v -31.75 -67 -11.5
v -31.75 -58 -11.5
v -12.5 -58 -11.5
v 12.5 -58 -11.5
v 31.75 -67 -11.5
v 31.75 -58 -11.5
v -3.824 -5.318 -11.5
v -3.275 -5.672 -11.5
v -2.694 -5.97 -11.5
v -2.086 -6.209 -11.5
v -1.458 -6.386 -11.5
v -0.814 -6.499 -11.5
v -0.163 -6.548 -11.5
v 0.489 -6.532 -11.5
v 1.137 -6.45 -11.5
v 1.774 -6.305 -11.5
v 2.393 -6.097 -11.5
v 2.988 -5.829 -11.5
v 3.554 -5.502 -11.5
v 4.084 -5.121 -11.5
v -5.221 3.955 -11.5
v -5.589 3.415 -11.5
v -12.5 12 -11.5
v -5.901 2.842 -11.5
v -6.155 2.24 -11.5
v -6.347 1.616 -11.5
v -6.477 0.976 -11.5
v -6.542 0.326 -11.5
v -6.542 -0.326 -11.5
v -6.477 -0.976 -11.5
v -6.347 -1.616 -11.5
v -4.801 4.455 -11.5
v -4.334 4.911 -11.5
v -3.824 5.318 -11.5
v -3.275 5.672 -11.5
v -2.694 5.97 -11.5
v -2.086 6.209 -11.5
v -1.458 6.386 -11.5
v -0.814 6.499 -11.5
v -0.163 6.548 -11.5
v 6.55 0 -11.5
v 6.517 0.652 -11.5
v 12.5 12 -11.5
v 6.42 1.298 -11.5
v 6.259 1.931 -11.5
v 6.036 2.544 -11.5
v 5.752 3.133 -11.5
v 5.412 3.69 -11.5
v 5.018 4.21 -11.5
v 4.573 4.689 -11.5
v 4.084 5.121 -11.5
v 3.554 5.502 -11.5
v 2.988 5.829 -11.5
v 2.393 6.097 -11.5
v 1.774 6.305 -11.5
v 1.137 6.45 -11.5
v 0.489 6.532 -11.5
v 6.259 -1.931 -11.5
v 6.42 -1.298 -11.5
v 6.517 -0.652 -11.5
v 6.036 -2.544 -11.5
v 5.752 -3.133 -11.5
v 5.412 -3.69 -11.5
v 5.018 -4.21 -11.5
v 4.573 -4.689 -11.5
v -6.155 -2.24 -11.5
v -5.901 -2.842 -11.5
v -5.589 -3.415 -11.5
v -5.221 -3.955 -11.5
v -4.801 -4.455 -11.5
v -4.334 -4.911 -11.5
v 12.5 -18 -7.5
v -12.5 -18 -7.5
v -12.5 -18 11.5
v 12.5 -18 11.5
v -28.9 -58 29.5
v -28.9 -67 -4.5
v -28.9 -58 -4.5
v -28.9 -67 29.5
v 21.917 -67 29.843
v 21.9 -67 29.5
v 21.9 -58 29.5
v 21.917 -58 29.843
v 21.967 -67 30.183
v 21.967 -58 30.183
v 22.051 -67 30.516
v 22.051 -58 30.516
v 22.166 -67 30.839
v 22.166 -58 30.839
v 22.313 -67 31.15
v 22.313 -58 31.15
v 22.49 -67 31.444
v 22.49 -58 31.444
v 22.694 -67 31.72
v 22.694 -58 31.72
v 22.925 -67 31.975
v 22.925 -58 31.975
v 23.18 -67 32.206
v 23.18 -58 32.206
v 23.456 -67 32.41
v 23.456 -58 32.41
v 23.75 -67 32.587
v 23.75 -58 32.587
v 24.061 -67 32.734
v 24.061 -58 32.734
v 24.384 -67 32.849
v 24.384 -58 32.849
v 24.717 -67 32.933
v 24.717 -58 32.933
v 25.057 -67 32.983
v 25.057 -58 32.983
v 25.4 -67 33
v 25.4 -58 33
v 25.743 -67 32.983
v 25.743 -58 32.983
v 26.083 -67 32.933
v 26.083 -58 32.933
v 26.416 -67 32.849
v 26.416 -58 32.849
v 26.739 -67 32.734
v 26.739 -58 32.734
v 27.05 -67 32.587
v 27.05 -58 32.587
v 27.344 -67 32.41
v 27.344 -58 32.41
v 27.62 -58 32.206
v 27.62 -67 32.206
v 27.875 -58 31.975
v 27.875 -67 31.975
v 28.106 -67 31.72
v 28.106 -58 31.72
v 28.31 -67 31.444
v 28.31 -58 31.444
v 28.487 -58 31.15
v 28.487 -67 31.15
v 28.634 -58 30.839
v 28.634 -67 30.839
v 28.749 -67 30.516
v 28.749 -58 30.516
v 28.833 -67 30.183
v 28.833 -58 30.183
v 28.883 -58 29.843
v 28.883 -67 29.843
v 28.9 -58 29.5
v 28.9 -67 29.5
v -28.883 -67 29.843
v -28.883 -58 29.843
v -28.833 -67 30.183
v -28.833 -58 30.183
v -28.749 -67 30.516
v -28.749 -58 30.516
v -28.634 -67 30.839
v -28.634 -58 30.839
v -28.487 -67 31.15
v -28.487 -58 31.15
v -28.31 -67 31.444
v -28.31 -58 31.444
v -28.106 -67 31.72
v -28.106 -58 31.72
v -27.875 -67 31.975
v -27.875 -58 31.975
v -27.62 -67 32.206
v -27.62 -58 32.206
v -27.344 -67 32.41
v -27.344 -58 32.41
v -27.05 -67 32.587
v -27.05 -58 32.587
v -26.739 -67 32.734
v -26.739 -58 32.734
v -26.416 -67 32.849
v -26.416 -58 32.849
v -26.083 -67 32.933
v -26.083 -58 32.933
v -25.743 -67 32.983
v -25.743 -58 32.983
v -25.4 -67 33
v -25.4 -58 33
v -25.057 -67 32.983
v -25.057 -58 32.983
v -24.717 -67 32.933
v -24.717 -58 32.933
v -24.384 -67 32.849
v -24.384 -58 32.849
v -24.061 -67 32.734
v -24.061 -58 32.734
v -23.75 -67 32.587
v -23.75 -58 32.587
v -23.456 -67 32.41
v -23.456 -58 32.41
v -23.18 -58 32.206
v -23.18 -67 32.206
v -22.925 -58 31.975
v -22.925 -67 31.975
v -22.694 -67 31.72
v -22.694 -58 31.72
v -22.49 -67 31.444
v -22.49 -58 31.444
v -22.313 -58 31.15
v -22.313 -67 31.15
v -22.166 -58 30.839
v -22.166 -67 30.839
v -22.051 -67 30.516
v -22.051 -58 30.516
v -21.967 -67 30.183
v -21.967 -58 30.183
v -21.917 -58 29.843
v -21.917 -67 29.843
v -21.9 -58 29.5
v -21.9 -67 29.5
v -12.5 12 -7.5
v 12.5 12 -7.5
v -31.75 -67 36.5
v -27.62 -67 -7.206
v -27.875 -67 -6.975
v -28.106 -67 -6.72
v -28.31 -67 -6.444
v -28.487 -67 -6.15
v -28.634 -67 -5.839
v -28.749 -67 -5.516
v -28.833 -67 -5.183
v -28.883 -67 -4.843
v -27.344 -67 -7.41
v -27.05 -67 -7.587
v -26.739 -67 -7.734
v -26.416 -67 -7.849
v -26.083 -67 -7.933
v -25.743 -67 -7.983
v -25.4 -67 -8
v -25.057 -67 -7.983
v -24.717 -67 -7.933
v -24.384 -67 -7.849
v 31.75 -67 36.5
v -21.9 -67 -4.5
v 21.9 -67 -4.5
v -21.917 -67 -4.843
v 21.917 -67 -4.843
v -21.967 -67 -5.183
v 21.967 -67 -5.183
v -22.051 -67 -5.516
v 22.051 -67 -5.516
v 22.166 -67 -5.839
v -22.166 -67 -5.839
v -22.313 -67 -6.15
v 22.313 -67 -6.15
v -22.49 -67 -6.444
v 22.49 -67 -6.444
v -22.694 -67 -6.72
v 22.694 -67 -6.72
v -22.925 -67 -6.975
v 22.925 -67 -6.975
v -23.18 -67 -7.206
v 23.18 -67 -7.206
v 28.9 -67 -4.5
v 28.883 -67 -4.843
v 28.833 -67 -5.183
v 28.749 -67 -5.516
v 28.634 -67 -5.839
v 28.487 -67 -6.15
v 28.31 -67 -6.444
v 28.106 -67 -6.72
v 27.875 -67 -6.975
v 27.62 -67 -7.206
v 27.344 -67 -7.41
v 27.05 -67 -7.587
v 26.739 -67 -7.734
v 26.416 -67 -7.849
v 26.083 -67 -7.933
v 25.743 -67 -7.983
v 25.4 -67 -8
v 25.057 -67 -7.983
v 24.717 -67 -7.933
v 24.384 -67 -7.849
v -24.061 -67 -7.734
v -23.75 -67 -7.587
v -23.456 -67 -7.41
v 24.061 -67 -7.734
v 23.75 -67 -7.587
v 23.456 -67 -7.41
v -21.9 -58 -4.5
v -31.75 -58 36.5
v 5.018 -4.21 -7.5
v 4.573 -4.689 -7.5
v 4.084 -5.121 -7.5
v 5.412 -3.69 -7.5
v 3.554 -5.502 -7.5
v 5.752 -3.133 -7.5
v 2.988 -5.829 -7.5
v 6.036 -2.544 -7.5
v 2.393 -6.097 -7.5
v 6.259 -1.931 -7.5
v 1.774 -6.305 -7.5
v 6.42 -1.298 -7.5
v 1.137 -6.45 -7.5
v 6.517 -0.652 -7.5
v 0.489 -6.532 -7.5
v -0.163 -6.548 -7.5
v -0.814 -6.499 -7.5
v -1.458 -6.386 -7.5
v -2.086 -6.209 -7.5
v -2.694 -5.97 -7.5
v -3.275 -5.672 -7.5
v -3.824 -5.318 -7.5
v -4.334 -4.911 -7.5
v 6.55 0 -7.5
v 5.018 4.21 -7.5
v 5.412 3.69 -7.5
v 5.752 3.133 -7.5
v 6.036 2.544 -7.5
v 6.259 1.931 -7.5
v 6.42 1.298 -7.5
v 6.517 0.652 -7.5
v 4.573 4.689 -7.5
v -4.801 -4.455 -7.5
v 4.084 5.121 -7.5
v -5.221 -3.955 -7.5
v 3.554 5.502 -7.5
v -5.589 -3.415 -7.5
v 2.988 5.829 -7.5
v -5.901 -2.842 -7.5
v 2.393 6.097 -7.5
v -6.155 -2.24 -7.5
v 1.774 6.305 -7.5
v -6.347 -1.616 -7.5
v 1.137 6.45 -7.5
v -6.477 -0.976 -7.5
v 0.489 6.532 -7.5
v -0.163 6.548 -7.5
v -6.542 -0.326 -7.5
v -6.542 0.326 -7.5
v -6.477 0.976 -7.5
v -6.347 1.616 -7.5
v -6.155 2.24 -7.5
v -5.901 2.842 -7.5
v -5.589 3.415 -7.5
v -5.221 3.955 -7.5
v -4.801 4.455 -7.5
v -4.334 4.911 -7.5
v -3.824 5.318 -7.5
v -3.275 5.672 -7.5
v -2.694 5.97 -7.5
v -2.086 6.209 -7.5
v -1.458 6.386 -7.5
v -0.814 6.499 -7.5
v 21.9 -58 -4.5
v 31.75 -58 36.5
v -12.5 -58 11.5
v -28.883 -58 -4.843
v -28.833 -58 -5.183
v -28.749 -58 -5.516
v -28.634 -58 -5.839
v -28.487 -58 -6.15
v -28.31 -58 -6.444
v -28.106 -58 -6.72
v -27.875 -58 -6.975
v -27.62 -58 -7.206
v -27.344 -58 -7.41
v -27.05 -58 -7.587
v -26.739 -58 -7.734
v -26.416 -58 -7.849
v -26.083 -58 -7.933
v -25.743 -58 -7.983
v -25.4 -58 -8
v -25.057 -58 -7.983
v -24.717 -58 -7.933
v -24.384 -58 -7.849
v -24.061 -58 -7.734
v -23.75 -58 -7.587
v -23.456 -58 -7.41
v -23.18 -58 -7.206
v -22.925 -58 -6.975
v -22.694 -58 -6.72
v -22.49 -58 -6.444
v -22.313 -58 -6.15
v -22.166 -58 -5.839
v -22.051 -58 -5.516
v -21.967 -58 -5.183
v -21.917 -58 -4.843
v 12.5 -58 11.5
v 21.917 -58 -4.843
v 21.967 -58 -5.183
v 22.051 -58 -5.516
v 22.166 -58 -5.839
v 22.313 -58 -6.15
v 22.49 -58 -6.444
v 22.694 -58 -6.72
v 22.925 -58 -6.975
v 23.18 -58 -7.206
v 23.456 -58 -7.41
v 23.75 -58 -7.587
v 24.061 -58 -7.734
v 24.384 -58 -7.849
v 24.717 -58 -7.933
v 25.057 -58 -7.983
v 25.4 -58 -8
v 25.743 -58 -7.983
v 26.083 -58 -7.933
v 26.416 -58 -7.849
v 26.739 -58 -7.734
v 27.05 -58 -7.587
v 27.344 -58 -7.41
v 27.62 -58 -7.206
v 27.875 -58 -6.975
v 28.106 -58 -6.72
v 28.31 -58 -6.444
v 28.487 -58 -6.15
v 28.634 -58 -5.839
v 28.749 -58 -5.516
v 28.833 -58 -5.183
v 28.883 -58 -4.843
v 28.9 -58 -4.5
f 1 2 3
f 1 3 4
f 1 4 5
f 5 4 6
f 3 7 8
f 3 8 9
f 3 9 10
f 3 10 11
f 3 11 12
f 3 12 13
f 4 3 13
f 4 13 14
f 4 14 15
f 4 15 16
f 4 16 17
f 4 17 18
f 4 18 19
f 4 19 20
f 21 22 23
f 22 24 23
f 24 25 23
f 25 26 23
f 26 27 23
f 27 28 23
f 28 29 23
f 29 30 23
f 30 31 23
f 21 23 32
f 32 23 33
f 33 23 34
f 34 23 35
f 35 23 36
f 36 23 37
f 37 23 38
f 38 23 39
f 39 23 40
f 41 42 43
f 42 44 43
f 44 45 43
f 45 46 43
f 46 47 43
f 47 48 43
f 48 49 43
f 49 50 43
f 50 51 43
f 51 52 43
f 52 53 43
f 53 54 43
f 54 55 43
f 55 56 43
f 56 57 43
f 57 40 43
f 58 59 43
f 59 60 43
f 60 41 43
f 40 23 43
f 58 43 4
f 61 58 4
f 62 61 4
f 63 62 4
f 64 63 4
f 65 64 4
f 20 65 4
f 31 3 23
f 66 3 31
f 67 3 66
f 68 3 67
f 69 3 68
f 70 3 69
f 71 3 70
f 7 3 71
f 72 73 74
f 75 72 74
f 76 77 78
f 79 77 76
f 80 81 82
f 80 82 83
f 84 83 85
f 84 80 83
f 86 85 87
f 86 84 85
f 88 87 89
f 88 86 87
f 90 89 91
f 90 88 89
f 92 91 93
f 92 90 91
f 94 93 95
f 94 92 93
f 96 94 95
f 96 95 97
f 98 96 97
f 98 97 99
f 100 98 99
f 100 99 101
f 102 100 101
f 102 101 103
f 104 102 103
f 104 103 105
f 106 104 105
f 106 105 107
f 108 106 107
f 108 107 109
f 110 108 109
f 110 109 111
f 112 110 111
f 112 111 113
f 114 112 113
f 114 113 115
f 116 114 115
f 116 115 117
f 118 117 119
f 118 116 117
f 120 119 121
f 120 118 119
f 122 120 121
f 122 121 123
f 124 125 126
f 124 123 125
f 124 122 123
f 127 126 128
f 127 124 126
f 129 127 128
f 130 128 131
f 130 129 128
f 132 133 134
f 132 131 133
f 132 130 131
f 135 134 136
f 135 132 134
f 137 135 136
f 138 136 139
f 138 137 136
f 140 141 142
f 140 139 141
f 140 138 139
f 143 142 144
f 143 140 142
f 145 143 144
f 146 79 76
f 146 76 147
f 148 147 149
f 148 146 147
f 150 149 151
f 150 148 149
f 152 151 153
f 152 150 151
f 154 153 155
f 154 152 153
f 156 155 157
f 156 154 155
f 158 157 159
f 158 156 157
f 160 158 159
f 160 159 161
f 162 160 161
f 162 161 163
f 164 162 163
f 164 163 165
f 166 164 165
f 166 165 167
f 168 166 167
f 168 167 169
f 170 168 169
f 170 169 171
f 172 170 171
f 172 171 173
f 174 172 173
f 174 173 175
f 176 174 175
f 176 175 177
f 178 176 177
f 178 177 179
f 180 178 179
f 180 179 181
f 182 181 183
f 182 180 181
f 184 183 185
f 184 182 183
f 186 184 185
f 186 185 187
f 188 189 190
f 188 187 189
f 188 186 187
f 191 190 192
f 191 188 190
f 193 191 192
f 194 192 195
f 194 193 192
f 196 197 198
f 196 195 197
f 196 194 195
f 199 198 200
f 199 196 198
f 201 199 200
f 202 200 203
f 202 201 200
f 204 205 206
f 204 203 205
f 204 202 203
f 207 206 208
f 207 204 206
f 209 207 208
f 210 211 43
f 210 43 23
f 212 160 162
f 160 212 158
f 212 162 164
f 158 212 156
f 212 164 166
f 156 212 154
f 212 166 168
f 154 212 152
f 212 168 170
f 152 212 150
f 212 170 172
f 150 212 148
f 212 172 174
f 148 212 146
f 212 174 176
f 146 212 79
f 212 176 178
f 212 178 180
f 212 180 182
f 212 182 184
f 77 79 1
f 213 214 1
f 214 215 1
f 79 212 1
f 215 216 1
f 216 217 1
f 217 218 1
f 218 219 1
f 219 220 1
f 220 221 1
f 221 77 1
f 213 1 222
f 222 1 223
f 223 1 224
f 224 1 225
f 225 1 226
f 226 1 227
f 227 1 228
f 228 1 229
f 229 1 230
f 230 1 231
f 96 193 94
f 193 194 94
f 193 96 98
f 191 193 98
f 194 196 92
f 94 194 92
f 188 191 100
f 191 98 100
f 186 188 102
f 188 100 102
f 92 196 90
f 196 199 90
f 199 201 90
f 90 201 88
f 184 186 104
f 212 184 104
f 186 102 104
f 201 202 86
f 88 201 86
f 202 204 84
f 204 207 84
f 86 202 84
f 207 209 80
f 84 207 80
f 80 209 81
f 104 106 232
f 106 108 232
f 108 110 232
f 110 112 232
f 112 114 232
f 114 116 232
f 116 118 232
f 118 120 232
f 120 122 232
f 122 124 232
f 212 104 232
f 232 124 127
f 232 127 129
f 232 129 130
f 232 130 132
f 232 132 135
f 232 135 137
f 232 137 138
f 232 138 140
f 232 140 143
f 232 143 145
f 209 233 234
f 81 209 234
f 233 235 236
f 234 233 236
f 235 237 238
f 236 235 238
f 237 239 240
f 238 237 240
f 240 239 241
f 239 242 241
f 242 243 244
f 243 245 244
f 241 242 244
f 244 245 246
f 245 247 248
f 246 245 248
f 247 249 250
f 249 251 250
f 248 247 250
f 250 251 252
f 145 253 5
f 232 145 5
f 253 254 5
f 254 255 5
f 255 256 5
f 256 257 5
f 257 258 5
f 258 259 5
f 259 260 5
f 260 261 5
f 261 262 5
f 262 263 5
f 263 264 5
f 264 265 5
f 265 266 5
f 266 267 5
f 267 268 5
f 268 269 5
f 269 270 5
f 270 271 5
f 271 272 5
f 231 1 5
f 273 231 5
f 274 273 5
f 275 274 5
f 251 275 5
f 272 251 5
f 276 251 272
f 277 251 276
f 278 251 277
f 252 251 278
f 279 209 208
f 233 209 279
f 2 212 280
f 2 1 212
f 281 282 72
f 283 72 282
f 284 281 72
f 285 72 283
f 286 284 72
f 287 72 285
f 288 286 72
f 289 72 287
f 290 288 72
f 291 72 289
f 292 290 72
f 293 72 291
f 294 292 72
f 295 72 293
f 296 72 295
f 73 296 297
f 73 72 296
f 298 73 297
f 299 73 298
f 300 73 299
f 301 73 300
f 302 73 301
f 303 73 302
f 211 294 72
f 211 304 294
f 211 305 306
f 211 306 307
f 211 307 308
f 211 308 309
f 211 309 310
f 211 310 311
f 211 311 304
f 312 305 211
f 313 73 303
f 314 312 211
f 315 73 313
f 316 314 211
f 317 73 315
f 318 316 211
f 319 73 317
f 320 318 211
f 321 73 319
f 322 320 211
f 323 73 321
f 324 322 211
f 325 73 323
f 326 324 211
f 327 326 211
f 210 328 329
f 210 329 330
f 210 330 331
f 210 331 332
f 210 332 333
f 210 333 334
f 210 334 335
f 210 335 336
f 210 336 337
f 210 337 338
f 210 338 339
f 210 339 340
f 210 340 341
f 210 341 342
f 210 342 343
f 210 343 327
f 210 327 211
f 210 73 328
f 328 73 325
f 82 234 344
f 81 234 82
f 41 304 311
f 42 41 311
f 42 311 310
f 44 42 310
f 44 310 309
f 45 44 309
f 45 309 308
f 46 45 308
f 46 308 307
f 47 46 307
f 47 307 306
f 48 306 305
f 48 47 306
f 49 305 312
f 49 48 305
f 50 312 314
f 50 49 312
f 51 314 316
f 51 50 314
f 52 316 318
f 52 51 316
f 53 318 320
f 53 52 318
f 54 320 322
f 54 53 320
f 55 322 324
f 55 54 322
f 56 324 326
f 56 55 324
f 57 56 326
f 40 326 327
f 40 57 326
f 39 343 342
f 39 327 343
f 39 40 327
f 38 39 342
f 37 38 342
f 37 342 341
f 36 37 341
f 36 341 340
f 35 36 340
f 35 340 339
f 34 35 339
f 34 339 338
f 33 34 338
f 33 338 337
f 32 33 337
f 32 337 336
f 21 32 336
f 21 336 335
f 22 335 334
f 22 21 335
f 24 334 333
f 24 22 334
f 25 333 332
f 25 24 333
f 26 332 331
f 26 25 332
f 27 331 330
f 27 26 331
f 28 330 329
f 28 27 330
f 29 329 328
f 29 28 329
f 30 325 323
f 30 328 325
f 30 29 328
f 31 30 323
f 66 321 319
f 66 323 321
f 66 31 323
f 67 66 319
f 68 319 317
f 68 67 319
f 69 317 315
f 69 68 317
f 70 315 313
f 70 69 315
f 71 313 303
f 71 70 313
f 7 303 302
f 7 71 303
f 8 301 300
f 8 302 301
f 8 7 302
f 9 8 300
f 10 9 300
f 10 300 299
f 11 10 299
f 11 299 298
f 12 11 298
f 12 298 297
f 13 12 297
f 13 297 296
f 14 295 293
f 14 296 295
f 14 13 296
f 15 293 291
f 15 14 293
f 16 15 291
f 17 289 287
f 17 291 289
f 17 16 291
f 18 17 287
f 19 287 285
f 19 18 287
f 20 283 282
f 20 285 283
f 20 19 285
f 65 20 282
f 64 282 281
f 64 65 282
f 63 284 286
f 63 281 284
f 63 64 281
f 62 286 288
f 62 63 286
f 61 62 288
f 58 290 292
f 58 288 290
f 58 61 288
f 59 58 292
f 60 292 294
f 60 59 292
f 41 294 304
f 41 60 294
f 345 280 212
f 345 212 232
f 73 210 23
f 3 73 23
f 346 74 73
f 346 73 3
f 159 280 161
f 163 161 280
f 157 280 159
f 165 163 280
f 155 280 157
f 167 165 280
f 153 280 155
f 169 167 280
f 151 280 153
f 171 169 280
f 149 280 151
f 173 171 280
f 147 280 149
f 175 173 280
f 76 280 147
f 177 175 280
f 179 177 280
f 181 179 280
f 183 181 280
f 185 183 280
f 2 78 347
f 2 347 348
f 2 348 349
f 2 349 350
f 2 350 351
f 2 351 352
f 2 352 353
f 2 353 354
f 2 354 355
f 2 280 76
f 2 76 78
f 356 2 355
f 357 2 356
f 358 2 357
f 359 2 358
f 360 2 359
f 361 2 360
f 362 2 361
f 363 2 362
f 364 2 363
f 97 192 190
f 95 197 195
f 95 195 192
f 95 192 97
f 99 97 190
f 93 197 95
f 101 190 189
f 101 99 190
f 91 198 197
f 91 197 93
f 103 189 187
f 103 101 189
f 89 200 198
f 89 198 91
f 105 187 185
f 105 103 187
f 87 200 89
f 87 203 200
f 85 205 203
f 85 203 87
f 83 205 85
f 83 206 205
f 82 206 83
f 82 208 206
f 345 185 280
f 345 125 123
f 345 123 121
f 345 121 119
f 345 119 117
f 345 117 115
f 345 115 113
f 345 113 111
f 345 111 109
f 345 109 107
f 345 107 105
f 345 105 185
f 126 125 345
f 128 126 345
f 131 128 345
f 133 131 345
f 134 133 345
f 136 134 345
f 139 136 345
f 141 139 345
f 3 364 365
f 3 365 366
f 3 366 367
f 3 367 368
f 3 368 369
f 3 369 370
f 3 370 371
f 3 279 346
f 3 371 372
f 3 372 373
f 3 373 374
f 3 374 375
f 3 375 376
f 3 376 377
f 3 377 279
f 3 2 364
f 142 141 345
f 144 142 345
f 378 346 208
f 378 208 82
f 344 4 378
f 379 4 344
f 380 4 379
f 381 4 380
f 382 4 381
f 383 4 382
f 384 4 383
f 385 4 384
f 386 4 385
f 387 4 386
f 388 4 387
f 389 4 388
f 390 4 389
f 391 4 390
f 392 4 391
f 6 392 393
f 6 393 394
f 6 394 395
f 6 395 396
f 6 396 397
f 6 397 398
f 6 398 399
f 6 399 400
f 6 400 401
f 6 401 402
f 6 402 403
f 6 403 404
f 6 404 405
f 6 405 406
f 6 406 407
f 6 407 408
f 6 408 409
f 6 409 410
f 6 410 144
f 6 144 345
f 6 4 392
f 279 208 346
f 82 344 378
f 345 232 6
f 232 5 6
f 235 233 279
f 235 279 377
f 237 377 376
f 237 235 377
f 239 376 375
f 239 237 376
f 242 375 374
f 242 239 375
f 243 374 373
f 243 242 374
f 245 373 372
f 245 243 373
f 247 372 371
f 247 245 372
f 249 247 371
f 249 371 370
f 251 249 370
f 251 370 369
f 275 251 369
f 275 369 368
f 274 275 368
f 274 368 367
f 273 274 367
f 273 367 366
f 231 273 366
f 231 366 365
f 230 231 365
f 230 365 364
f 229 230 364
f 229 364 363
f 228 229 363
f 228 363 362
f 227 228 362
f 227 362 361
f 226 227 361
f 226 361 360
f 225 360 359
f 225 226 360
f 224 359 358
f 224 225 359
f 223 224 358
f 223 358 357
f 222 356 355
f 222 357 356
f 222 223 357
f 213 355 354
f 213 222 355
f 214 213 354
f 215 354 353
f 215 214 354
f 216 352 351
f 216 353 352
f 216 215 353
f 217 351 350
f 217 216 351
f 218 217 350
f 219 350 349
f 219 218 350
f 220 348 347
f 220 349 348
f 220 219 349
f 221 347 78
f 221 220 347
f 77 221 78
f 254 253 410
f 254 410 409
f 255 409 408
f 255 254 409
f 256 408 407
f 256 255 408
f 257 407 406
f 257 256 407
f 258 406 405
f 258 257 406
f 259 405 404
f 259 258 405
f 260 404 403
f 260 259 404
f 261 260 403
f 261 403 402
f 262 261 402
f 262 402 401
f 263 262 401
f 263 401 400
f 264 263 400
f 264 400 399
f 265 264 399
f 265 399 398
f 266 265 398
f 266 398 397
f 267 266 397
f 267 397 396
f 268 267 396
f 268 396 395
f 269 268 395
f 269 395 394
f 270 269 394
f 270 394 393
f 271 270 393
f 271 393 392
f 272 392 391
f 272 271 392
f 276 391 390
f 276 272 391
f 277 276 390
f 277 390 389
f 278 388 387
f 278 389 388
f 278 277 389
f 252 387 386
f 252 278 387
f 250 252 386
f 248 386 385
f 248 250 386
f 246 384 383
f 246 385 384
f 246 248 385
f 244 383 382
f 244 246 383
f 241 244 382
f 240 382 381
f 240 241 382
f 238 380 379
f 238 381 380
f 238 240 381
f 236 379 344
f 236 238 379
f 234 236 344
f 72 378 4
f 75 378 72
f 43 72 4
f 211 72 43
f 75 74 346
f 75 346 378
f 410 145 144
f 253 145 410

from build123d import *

# Parameters (mm, degrees)
SKETCH1_R           = 6.55
BOSS_EXTRUDE1_DEPTH = 11.5
SKETCH9_W           = 19
SKETCH9_H           = 30
CUT_EXTRUDE4_DEPTH  = 45.25
SKETCH12_W          = 63.5
SKETCH12_H          = 9
BOSS_EXTRUDE2_DEPTH = 25
CUT_EXTRUDE5_DEPTH  = 80


with BuildPart() as part:
    # Sketch1 → Boss-Extrude1 (new body, symmetric)
    with BuildSketch(Plane.XY):
        Polygon((-12.5, -58), (-31.75, -58), (-31.75, -67), (31.75, -67), (31.75, -58), (12.5, -58), (12.5, 12), (-12.5, 12), align=None)
        Circle(SKETCH1_R, mode=Mode.SUBTRACT)
    extrude(amount=BOSS_EXTRUDE1_DEPTH, both=True)

    # Sketch9 → Cut-Extrude4 (cut, through all)
    with BuildSketch(Plane.ZY.offset(12.5)):
        with Locations((2, -3)):
            Rectangle(SKETCH9_W, SKETCH9_H)
    extrude(amount=-CUT_EXTRUDE4_DEPTH, mode=Mode.SUBTRACT)

    # Sketch12 → Boss-Extrude2 (add)
    with BuildSketch(Plane.XY.offset(11.5)):
        with Locations((0, -62.5)):
            Rectangle(SKETCH12_W, SKETCH12_H)
    extrude(amount=BOSS_EXTRUDE2_DEPTH)

    # Sketch11 → Cut-Extrude5 (cut, through all)
    with BuildSketch(Plane.XZ.offset(67)):
        with BuildLine():
            Line((-21.9, 29.5), (-21.9, -4.5))
            ThreePointArc((-21.9, -4.5), (-25.4, -8), (-28.9, -4.5))
            Line((-28.9, -4.5), (-28.9, 29.5))
            ThreePointArc((-28.9, 29.5), (-25.4, 33), (-21.9, 29.5))
        make_face()
        with BuildLine():
            Line((21.9, -4.5), (21.9, 29.5))
            ThreePointArc((21.9, 29.5), (25.4, 33), (28.9, 29.5))
            Line((28.9, 29.5), (28.9, -4.5))
            ThreePointArc((28.9, -4.5), (25.4, -8), (21.9, -4.5))
        make_face()
    extrude(amount=-CUT_EXTRUDE5_DEPTH, mode=Mode.SUBTRACT)


solid = part.part
